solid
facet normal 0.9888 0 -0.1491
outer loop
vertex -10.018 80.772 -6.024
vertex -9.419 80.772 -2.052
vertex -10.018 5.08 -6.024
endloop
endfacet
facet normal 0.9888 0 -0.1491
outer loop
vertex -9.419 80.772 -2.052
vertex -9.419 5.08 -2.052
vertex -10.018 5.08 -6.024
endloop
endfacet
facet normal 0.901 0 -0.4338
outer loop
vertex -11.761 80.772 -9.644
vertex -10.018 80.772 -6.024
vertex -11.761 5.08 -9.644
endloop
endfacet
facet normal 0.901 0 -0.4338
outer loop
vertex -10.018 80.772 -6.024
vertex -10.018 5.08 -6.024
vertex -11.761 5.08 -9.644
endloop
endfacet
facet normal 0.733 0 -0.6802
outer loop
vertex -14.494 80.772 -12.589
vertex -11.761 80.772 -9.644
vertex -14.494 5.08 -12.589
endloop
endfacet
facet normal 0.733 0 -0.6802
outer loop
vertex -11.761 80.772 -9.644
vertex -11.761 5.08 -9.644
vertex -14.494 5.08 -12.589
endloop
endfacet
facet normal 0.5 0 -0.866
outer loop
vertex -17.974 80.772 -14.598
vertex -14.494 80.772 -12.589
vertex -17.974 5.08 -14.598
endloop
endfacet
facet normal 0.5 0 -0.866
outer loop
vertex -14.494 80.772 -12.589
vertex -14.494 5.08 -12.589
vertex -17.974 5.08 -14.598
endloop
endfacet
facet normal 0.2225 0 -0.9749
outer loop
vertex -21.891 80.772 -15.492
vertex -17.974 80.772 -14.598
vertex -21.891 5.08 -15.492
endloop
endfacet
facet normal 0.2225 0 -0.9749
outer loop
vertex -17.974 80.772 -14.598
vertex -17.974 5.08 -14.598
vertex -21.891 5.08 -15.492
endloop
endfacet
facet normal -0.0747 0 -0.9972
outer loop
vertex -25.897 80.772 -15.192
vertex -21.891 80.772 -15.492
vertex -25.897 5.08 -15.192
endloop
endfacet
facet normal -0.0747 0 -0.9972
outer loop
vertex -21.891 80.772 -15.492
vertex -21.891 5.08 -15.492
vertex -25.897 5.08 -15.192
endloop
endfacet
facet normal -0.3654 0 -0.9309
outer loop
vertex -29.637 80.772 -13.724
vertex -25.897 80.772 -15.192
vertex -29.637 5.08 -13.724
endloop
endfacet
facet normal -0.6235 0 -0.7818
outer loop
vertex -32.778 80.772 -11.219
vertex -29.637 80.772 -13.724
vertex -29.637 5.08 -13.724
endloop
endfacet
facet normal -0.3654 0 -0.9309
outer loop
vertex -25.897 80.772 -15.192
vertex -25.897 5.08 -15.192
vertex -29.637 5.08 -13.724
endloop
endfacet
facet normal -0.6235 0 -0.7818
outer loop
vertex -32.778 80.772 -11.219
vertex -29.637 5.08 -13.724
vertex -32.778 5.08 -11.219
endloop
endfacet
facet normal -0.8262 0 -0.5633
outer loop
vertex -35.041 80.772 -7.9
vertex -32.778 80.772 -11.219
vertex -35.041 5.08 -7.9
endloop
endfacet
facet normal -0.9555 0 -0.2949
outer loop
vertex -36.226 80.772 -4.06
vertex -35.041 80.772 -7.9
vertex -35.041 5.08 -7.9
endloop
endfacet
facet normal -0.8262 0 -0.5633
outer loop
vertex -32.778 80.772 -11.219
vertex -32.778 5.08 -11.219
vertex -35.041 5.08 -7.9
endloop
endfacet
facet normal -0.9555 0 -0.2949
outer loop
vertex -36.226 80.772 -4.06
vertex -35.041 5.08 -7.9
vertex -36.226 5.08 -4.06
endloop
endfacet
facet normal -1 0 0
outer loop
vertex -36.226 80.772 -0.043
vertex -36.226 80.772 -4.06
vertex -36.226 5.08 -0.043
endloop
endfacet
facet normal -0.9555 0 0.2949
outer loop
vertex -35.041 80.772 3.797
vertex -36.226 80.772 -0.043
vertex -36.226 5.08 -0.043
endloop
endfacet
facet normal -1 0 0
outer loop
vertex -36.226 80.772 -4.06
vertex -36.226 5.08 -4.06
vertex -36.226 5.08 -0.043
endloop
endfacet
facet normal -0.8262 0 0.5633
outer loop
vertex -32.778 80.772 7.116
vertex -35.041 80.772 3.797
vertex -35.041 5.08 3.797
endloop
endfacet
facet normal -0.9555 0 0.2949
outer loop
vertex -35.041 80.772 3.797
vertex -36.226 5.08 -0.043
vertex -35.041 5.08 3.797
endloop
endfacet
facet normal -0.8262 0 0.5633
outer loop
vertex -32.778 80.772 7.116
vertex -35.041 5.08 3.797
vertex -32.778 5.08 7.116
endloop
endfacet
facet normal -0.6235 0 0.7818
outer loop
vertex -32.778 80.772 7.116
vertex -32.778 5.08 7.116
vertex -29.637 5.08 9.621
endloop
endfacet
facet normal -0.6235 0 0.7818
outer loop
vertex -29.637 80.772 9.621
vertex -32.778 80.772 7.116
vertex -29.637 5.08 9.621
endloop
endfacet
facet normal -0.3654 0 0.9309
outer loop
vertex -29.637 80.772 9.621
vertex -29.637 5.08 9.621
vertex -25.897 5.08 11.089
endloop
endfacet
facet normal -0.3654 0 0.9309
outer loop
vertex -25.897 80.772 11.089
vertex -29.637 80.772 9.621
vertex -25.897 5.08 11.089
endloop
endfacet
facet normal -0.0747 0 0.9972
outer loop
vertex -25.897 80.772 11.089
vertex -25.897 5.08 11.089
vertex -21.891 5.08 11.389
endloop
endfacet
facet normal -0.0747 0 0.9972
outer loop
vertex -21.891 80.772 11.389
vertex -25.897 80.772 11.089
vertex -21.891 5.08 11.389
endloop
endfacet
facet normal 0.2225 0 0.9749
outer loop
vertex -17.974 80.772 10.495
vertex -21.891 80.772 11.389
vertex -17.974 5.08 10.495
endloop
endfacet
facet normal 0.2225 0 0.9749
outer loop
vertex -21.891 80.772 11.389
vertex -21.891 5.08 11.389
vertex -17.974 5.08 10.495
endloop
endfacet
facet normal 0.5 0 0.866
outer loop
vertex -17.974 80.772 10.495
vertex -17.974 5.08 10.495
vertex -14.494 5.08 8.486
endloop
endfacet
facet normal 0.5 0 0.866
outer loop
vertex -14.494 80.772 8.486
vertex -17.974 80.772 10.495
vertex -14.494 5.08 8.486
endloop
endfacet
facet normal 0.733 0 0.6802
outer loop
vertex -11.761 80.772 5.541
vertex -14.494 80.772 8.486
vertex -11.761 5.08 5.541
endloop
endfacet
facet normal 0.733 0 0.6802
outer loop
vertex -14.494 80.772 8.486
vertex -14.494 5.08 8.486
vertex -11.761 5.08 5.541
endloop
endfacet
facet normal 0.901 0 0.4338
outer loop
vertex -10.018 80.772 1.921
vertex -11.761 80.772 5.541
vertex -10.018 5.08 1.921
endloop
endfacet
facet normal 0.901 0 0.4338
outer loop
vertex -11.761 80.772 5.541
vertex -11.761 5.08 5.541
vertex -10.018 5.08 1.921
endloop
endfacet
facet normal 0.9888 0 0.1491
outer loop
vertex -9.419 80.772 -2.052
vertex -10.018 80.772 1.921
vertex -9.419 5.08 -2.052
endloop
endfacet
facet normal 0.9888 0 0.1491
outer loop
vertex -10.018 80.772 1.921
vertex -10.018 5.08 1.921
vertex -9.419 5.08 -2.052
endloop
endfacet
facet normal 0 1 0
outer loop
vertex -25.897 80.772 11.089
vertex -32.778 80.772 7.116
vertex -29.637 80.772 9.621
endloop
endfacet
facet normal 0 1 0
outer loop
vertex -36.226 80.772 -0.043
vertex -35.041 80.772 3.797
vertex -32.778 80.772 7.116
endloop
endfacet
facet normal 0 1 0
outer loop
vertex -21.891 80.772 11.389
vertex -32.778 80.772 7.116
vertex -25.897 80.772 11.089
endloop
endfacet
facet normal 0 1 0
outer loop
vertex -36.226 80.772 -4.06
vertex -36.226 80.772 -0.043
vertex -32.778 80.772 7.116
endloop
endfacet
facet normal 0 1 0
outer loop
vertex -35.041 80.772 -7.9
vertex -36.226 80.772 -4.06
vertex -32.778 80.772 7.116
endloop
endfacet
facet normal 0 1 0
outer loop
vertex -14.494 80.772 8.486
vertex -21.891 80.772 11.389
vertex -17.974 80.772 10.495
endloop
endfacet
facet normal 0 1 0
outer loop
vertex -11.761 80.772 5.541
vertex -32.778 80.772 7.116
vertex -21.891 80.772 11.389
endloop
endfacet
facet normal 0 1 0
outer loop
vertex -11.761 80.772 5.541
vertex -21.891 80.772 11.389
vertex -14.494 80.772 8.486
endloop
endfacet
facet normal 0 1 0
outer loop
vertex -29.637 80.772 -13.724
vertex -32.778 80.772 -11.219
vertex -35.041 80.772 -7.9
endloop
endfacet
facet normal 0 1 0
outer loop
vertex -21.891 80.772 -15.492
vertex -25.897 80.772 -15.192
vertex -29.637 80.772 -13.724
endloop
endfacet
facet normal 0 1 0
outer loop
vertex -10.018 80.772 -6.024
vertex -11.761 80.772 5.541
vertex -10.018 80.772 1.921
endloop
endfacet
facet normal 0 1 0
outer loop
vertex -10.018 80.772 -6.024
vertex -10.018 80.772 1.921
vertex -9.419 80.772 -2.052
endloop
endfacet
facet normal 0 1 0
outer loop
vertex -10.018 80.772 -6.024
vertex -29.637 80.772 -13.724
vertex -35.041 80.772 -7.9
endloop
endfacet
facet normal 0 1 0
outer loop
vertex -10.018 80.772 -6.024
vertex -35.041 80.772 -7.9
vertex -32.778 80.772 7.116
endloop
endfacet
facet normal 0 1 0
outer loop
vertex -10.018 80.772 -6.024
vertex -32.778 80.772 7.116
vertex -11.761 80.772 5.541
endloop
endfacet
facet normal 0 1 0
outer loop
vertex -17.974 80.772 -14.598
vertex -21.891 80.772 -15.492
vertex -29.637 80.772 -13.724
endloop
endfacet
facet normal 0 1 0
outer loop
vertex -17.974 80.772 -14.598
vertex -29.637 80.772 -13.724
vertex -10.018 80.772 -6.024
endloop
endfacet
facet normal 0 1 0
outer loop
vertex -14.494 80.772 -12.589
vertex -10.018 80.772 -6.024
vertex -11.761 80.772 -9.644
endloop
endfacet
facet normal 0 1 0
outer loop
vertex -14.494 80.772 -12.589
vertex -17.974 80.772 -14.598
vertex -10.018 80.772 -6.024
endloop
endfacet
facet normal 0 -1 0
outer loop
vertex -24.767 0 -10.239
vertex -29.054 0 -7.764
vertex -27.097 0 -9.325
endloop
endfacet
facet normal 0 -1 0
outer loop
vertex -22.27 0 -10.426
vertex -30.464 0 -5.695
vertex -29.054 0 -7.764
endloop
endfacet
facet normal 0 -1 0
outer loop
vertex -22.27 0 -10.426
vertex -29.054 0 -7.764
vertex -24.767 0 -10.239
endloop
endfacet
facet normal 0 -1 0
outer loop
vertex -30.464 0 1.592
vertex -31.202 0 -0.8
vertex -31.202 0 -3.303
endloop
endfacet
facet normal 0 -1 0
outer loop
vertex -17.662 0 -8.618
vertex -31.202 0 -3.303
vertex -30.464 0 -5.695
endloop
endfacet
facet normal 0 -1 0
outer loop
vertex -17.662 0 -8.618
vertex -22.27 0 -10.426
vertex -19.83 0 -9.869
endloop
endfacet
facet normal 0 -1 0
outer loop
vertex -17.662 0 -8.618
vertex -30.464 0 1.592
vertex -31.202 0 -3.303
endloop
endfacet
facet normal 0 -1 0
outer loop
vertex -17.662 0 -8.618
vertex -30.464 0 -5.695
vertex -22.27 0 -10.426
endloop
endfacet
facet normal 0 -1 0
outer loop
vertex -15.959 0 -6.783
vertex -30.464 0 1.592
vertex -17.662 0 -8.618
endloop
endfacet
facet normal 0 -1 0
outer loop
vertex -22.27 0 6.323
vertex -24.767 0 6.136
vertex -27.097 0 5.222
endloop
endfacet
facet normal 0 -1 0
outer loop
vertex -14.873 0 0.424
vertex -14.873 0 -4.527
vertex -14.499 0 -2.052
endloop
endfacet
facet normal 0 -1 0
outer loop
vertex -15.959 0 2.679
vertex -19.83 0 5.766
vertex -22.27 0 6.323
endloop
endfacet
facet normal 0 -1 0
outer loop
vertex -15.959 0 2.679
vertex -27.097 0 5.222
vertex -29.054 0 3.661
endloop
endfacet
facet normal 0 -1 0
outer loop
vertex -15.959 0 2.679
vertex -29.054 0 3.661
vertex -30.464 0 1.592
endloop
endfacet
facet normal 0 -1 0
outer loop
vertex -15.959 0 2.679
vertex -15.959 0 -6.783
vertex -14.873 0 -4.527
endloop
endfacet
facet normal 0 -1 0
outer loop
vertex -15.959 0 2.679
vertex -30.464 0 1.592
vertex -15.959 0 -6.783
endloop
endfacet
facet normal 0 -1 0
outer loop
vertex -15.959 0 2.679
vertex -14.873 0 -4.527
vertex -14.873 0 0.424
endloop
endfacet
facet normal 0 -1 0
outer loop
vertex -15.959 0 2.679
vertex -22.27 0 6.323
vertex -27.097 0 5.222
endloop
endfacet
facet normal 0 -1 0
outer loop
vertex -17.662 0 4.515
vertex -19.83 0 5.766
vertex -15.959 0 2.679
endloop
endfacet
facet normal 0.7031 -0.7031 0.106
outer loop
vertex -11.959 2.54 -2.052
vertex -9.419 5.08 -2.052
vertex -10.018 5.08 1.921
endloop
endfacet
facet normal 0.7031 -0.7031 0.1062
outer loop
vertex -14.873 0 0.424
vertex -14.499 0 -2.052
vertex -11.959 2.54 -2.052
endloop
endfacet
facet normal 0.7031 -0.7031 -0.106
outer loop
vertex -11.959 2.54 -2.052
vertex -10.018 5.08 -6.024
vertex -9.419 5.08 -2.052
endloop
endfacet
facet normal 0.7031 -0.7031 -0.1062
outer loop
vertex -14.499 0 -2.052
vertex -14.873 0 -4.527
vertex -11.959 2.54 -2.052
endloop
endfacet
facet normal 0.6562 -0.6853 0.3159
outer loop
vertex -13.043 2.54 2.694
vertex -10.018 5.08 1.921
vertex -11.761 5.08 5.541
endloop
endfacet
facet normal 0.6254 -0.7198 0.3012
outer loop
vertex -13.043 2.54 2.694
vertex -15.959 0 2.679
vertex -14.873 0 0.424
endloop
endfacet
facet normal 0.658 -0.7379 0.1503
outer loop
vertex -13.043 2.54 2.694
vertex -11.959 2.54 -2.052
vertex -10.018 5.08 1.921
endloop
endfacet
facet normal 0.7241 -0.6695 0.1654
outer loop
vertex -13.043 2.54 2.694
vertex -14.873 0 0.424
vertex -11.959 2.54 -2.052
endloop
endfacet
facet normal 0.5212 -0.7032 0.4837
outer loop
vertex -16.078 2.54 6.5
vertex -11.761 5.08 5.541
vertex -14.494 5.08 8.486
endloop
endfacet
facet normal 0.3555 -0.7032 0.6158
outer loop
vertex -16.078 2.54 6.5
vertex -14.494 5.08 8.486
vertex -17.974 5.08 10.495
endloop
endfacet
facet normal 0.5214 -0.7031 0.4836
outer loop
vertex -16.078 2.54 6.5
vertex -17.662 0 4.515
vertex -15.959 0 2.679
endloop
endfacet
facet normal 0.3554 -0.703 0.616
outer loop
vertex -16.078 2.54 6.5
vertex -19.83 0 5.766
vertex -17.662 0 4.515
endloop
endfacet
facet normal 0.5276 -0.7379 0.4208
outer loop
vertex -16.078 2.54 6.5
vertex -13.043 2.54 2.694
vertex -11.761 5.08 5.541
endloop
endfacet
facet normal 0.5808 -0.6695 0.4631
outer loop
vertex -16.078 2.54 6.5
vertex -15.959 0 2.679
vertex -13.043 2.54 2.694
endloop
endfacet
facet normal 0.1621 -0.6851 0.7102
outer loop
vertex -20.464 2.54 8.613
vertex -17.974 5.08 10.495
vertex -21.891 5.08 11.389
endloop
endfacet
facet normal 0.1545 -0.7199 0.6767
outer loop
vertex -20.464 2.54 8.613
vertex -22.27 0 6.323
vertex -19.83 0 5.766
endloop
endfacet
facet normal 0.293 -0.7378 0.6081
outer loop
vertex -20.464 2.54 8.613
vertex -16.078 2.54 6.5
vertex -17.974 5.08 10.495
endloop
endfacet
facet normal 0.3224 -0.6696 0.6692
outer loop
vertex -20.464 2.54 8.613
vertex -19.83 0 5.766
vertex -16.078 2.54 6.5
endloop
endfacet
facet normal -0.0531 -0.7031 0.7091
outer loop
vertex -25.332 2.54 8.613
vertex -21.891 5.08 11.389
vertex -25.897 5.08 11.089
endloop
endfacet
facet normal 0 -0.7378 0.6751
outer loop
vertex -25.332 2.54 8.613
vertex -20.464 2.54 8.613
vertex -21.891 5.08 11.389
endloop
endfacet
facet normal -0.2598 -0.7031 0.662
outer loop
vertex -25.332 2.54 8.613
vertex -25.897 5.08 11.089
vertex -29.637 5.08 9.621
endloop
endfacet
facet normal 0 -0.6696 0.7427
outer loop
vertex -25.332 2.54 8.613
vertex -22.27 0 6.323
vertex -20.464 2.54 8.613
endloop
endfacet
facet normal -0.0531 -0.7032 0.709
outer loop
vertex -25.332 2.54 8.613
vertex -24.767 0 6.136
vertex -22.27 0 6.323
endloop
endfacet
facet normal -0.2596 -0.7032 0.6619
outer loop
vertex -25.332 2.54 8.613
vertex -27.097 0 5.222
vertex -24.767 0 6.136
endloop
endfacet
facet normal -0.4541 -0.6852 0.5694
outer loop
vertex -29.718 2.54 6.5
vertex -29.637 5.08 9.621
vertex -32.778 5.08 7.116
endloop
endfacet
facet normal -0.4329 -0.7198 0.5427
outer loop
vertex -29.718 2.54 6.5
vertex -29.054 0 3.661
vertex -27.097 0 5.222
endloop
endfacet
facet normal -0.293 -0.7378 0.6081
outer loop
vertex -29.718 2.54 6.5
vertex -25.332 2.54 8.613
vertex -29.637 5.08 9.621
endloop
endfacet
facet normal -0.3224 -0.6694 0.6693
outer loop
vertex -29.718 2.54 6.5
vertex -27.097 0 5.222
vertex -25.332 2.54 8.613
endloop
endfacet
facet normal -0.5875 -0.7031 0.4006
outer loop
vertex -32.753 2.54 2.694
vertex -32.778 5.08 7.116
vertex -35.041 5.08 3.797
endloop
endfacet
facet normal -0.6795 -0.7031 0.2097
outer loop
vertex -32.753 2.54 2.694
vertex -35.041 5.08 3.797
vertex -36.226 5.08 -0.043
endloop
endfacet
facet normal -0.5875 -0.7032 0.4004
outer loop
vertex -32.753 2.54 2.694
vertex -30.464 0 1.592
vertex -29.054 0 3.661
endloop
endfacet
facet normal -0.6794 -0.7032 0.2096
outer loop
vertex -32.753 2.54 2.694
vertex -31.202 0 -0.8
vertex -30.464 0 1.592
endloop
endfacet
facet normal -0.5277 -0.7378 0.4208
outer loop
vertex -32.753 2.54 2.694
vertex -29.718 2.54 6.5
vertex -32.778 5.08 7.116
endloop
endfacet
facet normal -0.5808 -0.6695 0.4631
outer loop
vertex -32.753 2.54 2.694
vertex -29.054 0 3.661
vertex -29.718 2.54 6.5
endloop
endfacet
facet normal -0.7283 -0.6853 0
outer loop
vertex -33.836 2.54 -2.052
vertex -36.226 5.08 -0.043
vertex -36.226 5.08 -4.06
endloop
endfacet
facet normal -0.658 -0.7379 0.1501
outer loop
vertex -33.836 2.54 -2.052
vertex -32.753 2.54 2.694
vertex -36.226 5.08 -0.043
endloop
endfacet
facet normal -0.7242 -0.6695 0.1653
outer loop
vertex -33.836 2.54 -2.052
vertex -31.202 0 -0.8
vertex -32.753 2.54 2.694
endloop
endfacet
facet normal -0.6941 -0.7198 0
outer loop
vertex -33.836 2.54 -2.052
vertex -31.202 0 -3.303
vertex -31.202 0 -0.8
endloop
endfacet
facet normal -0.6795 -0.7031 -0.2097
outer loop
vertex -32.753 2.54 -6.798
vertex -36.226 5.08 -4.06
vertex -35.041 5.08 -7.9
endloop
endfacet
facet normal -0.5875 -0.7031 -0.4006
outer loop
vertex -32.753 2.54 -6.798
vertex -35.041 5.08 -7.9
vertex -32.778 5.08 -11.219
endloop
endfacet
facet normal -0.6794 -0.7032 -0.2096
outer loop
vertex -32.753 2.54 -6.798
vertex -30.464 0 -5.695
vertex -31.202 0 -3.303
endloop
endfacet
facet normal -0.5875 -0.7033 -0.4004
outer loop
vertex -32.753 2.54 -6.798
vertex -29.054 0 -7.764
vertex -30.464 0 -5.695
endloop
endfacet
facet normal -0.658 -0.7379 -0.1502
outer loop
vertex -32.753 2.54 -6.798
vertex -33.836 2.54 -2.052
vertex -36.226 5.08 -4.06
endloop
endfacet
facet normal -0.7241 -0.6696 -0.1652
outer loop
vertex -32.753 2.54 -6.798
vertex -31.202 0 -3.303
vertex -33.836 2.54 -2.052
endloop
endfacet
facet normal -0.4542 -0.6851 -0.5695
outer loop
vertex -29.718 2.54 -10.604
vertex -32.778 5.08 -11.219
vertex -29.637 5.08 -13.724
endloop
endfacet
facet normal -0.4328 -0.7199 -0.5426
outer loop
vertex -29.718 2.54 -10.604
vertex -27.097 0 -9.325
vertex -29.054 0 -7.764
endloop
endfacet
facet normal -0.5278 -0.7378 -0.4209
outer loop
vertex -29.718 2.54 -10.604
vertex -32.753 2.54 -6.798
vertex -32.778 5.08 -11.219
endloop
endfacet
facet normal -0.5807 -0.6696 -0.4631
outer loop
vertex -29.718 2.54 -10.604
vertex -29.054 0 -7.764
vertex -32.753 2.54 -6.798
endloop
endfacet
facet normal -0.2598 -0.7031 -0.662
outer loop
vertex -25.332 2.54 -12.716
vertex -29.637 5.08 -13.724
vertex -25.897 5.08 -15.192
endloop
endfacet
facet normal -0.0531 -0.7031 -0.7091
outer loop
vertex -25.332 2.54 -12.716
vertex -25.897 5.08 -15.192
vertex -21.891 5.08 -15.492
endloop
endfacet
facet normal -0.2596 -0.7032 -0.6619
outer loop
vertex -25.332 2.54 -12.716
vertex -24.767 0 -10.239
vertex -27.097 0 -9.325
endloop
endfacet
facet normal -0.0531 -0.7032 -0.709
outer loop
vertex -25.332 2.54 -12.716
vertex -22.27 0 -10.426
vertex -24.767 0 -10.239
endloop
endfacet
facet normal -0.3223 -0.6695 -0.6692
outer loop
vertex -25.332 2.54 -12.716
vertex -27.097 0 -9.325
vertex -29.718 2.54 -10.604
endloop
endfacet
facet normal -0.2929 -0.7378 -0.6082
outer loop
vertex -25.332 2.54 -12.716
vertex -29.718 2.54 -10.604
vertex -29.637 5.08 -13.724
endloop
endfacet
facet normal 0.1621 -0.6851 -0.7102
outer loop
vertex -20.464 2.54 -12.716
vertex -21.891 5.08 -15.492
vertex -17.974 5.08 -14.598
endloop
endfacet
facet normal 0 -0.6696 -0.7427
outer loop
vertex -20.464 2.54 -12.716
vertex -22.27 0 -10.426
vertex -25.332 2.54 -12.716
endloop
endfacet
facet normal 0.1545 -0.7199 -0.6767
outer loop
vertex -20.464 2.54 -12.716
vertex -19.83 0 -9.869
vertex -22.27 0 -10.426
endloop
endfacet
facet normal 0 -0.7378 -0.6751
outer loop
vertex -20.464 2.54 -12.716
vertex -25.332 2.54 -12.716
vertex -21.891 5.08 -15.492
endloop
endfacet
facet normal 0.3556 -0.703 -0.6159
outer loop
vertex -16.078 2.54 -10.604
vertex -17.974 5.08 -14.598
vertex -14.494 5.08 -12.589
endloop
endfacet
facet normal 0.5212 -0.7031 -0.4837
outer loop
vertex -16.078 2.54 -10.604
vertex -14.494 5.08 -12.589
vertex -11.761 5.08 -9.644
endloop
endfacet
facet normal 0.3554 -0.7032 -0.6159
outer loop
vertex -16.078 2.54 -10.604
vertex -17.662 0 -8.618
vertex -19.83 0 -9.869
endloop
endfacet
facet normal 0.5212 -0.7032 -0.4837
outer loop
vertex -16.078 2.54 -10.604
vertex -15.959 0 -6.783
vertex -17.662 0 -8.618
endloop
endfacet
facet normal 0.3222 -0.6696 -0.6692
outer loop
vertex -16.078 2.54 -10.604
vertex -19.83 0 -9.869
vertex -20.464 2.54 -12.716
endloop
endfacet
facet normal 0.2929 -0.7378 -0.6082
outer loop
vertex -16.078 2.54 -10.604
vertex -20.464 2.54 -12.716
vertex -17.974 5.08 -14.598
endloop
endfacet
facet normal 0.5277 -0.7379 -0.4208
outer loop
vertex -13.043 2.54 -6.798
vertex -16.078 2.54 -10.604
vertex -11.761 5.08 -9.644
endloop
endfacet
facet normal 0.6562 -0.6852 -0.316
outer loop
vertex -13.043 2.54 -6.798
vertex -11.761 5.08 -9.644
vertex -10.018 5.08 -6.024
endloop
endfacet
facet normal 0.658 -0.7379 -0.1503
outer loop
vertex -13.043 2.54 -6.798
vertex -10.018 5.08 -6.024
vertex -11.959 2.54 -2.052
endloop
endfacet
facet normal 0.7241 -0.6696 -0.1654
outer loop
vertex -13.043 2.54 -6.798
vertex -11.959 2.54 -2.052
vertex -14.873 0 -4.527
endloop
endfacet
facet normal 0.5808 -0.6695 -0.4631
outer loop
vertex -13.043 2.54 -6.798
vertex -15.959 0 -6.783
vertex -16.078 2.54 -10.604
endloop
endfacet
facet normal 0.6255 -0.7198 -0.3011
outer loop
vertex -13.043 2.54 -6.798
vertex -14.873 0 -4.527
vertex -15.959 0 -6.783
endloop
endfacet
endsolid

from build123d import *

# Parameters (mm, degrees)
F0_R      = 13.478369
F1_DEPTH  = 55.372
F2_SIZE   = 5.08
F1_FACE_R = 13.478369
F3_DEPTH  = 25.4


with BuildPart() as f1:
    # F0 (on Front) → F1 (new body)
    with BuildSketch(Plane.XZ):
        with Locations((-22.897817, -2.051539)):
            Circle(F0_R)
    extrude(amount=-F1_DEPTH)

    # F2
    f2_edges = [f1.edges().sort_by_distance(p)[0] for p in [
        (-36.376187, 0, -2.051539),
    ]]
    chamfer(f2_edges, length=F2_SIZE)

    # F1_face (on face) → F3 (join)
    with BuildSketch(Plane(origin=(-22.897817, 55.372, -2.051539), x_dir=(1, 0, 0), z_dir=(0, 1, 0))):
        Circle(F1_FACE_R)
    extrude(amount=F3_DEPTH)


solid = f1.part
